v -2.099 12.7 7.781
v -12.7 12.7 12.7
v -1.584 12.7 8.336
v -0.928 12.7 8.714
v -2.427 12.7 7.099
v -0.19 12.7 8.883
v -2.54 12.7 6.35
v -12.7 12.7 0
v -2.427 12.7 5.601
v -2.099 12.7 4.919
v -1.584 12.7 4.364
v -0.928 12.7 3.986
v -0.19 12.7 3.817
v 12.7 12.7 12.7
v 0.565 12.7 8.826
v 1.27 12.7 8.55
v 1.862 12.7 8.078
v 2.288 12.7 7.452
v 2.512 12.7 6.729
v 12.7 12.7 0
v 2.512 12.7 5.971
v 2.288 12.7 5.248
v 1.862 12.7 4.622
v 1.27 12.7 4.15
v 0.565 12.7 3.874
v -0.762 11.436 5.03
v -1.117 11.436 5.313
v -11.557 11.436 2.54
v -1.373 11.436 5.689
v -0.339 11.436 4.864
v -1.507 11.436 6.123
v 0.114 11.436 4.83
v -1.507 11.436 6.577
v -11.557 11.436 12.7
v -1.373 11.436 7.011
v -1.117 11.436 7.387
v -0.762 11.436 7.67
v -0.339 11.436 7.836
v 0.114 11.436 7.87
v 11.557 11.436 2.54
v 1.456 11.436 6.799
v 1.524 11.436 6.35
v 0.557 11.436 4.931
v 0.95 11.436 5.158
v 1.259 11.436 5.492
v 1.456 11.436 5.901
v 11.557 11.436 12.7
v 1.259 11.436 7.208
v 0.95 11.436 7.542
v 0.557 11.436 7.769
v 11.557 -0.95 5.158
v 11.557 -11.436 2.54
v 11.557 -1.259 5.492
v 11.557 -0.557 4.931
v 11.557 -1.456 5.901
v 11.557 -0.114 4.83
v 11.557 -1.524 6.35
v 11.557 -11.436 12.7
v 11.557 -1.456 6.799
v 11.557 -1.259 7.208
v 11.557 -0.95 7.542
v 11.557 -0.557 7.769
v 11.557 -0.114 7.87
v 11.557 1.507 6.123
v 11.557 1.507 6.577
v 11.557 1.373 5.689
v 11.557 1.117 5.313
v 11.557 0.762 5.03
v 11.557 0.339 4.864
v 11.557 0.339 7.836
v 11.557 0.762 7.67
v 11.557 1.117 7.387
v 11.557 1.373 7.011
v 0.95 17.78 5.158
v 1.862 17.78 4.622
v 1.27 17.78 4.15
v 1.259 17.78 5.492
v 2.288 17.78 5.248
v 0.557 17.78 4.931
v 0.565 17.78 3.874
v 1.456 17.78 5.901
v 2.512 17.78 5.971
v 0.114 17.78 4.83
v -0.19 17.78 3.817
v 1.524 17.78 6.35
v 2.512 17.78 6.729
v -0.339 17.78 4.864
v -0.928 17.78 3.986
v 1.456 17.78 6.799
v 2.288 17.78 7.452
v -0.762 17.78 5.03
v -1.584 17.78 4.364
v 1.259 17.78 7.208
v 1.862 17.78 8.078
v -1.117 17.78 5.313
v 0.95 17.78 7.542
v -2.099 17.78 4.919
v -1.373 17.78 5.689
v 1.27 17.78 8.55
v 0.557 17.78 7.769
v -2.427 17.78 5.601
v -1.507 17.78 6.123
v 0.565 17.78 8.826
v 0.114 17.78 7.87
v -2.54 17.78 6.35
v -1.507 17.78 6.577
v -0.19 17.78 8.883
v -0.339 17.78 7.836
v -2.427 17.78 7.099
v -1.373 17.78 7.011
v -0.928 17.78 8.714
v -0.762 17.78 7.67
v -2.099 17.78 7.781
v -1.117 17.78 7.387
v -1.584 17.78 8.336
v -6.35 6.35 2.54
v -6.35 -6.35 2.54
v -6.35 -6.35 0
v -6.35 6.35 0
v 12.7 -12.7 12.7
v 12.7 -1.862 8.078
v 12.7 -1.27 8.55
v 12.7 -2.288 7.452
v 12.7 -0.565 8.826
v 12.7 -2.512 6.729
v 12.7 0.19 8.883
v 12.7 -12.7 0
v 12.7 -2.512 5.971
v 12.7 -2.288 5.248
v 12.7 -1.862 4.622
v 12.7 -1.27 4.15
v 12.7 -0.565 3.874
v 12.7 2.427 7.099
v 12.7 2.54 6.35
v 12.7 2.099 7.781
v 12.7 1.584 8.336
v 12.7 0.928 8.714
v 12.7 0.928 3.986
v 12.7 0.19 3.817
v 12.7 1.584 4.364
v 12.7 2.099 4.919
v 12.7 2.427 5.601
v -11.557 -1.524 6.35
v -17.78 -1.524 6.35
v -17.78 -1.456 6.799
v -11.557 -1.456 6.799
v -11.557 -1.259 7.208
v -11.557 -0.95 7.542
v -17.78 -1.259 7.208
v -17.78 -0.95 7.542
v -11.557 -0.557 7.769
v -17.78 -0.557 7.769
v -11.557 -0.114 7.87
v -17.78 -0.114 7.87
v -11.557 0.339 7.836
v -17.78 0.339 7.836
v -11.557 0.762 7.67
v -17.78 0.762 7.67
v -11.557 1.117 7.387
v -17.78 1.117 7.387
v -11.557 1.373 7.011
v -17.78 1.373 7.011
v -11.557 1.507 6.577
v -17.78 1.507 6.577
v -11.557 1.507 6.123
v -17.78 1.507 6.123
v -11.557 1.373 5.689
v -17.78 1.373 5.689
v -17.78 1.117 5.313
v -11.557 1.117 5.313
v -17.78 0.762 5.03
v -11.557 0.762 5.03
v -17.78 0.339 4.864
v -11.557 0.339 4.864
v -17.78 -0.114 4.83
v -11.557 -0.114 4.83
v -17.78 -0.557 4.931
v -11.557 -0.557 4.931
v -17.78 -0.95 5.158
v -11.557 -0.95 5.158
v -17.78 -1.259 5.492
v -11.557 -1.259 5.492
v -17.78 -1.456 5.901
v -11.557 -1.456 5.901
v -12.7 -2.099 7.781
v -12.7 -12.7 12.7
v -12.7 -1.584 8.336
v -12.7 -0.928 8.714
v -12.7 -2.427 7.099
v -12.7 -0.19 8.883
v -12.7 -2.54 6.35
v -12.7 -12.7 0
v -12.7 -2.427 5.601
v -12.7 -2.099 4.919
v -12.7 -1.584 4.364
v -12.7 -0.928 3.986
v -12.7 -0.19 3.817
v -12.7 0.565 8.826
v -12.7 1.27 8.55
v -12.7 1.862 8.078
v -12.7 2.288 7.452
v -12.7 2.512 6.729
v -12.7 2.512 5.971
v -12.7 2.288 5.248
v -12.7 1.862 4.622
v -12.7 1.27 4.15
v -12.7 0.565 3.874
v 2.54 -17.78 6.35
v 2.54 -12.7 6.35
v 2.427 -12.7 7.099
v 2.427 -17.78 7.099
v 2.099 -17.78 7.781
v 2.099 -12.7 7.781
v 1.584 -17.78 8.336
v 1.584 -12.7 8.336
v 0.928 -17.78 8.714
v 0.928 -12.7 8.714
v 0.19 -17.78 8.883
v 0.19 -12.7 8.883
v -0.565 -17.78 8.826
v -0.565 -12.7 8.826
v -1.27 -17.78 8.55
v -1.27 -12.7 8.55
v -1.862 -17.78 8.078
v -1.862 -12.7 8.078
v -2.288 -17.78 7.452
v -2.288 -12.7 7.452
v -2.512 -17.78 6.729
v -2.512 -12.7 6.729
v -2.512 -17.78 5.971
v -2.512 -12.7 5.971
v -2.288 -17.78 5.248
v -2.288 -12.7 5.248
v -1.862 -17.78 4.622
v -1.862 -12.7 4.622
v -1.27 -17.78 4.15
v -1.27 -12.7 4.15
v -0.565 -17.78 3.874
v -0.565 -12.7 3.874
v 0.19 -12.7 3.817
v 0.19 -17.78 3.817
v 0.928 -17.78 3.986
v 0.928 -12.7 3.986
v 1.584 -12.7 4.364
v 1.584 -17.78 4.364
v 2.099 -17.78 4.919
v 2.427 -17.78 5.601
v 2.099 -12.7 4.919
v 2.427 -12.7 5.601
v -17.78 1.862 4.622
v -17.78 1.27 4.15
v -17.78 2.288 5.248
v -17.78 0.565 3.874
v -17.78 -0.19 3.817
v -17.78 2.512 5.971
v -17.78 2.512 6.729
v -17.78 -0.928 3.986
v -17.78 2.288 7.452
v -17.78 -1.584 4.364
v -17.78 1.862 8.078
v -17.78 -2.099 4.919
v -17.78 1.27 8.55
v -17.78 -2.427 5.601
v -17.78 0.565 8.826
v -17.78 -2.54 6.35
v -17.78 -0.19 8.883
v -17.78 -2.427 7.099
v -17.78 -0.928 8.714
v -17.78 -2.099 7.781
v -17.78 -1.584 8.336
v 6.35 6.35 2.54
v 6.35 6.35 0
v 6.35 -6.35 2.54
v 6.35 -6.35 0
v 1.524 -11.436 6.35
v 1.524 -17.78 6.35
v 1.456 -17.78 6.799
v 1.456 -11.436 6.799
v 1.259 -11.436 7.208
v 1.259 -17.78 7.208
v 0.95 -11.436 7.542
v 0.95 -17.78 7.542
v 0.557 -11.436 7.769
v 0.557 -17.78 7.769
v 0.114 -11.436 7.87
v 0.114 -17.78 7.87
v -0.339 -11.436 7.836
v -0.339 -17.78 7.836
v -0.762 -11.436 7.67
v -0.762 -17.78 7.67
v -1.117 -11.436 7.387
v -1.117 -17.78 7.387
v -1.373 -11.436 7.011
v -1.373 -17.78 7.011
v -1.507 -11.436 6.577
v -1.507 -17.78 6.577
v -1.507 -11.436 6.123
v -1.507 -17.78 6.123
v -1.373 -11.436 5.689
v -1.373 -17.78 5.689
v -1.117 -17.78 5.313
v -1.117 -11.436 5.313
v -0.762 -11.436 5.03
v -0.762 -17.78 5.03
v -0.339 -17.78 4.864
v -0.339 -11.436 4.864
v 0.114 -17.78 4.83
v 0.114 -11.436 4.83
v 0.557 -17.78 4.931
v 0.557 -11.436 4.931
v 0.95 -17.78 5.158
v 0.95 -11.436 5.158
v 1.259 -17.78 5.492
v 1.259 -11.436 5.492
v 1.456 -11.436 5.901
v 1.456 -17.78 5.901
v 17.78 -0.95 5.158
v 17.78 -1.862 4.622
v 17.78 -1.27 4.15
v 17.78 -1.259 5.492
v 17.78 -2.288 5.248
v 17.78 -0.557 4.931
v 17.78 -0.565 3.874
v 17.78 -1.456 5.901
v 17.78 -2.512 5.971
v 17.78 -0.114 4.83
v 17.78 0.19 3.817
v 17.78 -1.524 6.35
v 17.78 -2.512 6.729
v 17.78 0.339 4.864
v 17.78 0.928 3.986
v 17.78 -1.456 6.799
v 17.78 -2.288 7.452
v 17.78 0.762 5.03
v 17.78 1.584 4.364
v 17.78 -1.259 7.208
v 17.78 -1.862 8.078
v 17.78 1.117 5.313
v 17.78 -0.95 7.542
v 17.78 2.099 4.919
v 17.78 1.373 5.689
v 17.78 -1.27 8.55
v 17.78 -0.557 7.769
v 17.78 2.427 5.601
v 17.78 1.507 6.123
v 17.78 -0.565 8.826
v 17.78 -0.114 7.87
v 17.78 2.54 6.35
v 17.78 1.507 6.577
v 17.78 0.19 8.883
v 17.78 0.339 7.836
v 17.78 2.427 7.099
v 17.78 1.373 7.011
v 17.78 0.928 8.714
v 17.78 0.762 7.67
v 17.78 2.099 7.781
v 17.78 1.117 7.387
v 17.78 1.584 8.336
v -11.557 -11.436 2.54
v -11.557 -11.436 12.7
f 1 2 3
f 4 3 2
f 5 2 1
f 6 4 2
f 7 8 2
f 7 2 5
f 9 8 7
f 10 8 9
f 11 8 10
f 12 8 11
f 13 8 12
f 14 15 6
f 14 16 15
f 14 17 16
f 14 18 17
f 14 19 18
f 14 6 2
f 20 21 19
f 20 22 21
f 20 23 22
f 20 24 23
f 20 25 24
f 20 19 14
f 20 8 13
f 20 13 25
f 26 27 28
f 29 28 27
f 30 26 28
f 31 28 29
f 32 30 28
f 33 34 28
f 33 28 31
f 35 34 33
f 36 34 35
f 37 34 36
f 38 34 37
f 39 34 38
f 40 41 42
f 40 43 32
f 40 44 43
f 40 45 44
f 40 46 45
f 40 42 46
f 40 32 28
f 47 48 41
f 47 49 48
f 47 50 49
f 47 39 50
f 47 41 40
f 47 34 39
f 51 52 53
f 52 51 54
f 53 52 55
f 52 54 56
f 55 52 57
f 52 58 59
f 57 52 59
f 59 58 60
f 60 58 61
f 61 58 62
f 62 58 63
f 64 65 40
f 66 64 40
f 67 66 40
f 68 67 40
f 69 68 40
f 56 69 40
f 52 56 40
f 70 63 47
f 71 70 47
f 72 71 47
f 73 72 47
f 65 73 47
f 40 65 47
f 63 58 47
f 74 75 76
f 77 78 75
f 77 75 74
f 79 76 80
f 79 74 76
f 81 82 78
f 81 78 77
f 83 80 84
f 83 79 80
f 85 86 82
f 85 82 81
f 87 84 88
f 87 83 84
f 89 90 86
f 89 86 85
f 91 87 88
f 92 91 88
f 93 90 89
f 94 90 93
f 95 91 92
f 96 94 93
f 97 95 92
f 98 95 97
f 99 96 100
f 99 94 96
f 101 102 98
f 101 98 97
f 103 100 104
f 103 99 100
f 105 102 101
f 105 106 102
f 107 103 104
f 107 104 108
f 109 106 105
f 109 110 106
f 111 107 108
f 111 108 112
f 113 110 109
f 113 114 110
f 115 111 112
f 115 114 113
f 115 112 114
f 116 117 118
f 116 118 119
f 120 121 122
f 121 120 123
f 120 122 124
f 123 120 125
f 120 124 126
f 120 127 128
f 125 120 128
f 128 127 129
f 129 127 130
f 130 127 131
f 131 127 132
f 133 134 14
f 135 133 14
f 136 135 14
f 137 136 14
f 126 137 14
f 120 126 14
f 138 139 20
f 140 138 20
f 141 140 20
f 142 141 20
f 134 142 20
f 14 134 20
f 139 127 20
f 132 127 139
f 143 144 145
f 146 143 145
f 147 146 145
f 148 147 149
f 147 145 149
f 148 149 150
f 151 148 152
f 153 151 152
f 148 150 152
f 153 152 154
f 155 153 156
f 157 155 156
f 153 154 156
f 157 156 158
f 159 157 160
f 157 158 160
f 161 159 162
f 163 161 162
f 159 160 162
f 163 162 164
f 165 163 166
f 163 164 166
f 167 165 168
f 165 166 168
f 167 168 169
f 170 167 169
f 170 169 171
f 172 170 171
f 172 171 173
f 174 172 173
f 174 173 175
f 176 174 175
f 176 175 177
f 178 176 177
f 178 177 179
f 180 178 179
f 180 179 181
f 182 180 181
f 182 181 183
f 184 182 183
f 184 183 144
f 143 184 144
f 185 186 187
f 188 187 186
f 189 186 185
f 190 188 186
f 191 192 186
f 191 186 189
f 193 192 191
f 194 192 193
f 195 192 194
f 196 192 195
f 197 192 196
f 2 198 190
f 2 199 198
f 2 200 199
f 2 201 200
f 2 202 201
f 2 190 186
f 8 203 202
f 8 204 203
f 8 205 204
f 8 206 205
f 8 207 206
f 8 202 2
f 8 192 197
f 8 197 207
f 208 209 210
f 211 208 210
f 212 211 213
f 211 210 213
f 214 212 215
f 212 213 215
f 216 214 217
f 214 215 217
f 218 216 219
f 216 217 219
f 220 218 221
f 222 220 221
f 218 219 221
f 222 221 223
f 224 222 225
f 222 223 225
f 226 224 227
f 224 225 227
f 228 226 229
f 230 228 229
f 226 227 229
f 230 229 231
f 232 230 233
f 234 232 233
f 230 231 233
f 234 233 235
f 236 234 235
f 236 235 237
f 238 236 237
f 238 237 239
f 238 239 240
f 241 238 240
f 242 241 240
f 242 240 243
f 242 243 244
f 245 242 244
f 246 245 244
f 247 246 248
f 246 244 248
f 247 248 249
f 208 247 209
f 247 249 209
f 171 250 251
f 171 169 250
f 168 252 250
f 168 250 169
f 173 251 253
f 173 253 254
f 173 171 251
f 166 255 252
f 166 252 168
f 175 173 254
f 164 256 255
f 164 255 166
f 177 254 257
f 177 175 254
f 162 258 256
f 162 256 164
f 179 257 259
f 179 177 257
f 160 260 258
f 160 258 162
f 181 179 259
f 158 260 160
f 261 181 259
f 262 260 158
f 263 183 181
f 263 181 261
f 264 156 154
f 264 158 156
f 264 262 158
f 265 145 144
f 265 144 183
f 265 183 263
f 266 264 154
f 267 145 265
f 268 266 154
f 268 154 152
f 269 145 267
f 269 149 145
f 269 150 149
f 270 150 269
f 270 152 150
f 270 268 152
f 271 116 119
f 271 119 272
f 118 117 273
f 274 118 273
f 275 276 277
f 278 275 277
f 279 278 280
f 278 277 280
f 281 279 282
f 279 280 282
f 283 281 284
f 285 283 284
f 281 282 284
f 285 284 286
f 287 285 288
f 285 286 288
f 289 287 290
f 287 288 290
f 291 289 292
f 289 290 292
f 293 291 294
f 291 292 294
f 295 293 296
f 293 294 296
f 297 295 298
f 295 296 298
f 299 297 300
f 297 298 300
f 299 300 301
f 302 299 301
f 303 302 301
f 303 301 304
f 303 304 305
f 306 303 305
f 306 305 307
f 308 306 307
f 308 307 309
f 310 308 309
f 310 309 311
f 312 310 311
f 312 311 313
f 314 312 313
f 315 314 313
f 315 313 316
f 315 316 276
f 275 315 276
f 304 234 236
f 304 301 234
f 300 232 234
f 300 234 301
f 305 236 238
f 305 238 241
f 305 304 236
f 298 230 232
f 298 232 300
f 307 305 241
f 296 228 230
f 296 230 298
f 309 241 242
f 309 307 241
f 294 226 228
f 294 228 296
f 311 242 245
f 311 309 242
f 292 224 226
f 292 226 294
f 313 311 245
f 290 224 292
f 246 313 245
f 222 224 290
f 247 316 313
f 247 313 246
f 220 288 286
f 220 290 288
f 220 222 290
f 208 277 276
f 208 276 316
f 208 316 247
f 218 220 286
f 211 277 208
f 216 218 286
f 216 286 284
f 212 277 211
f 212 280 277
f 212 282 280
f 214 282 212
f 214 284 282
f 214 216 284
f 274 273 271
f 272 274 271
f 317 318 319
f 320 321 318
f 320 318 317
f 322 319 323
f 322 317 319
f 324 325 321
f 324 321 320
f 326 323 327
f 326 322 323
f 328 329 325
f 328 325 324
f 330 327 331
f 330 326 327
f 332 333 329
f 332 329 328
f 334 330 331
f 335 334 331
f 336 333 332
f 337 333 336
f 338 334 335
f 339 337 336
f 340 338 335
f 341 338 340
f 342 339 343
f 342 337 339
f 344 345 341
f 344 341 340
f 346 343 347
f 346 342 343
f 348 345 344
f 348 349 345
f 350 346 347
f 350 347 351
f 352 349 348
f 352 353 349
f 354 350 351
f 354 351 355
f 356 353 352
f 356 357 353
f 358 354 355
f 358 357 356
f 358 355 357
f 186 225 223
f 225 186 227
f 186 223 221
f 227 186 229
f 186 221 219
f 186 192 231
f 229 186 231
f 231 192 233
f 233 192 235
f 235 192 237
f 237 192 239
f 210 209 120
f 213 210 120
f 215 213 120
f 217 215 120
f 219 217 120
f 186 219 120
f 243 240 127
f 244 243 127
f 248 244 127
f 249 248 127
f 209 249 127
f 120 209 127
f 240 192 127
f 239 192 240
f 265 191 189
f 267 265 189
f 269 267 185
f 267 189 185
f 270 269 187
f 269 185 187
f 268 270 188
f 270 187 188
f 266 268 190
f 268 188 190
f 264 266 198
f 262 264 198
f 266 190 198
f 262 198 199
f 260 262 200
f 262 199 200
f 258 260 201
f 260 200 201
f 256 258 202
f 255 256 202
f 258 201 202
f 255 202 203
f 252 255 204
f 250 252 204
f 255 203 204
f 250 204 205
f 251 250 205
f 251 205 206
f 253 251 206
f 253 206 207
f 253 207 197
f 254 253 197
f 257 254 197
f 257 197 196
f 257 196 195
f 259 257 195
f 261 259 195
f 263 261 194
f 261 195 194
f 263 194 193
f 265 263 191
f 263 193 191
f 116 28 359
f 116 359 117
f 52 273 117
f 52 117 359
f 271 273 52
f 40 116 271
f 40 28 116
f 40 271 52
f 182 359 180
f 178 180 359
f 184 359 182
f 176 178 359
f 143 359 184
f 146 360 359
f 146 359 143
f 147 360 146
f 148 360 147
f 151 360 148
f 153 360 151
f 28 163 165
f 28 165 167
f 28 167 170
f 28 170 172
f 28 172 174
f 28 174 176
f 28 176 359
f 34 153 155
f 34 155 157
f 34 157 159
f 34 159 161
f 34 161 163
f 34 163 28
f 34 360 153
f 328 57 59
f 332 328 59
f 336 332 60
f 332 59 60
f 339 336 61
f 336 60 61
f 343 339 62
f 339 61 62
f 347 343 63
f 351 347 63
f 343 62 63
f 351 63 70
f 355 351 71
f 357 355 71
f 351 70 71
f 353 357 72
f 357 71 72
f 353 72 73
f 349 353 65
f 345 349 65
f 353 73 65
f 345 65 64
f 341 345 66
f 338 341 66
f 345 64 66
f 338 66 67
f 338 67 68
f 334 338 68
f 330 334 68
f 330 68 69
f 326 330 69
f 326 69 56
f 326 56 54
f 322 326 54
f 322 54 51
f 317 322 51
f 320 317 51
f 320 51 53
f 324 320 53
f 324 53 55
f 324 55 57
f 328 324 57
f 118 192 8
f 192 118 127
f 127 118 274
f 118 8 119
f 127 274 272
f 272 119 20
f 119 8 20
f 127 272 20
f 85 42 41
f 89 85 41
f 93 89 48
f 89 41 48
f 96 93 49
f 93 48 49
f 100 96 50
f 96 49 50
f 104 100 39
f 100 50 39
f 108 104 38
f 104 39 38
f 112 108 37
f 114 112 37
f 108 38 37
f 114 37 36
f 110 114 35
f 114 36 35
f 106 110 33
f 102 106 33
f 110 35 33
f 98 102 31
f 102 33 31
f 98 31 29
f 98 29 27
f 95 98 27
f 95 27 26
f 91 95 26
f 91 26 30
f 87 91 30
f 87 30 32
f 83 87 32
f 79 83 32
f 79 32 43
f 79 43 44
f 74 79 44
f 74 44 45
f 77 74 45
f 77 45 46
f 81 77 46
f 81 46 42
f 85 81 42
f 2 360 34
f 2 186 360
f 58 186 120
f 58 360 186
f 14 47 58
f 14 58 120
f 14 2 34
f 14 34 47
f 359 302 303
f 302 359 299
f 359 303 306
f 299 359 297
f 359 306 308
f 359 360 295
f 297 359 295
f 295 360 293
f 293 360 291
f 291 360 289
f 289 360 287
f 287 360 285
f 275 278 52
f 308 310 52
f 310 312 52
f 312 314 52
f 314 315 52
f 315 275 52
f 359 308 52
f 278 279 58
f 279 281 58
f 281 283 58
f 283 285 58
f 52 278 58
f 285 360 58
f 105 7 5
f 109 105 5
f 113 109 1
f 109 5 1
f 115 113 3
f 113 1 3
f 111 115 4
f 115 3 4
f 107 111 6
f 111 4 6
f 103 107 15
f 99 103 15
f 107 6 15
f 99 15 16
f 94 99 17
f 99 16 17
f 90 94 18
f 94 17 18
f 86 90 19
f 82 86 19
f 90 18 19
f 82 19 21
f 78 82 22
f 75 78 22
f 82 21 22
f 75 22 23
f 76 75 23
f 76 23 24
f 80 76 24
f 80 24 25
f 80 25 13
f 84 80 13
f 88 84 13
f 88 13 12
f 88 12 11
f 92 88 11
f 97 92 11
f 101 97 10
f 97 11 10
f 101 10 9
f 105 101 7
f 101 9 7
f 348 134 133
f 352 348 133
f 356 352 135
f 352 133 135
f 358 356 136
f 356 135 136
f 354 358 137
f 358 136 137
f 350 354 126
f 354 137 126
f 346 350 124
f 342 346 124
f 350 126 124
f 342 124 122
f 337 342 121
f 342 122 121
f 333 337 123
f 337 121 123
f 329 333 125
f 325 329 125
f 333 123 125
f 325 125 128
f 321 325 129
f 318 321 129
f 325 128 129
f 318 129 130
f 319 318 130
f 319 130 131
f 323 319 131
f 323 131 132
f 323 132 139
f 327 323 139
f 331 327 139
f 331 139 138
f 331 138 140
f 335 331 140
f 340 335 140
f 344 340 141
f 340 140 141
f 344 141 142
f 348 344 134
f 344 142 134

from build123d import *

# Parameters (mm, degrees)
F0_W      = 25.4
F0_H      = 25.4
F1_DEPTH  = 12.7
F2_W      = 23.1146477163
F2_H      = 22.8712297976
F3_DEPTH  = 10.16
F4_R      = 2.54
F5_DEPTH  = 5.08
F6_R      = 2.54
F7_DEPTH  = 5.08
F8_R      = 1.524
F9_DEPTH  = 35.561
F10_R     = 2.54
F11_DEPTH = 5.08
F12_R     = 2.54
F13_DEPTH = 5.08
F14_R     = 1.524
F15_DEPTH = 35.561
F16_W     = 12.7
F16_H     = 12.7
F17_DEPTH = 2.541


with BuildPart() as f1:
    # F0 (on Top) → F1 (new body)
    with BuildSketch(Plane.XY):
        Rectangle(F0_W, F0_H)
    extrude(amount=F1_DEPTH)

    # F2 (on face) → F3 (cut)
    with BuildSketch(Plane.XY.offset(12.7)):
        Rectangle(F2_W, F2_H)
    extrude(amount=-F3_DEPTH, mode=Mode.SUBTRACT)

    # F4 (on face) → F5 (join)
    with BuildSketch(Plane(origin=(0, 12.7, 0), x_dir=(-1, 0, 0), z_dir=(0, 1, 0))):
        with Locations((0, 6.35)):
            Circle(F4_R)
    extrude(amount=F5_DEPTH)

    # F6 (on face) → F7 (join)
    with BuildSketch(Plane.XZ.offset(12.7)):
        with Locations((0, 6.35)):
            Circle(F6_R)
    extrude(amount=F7_DEPTH)

    # F8 (on face) → F9 (cut, through all)
    with BuildSketch(Plane.XZ.offset(17.78)):
        with Locations((0, 6.35)):
            Circle(F8_R)
    extrude(amount=-F9_DEPTH, mode=Mode.SUBTRACT)

    # F10 (on face) → F11 (join)
    with BuildSketch(Plane.YZ.offset(12.7)):
        with Locations((0, 6.35)):
            Circle(F10_R)
    extrude(amount=F11_DEPTH)

    # F12 (on face) → F13 (join)
    with BuildSketch(Plane(origin=(-12.7, 0, 0), x_dir=(0, -1, 0), z_dir=(-1, 0, 0))):
        with Locations((0, 6.35)):
            Circle(F12_R)
    extrude(amount=F13_DEPTH)

    # F14 (on face) → F15 (cut, through all)
    with BuildSketch(Plane(origin=(-17.78, 0, 0), x_dir=(0, -1, 0), z_dir=(-1, 0, 0))):
        with Locations((0, 6.35)):
            Circle(F14_R)
    extrude(amount=-F15_DEPTH, mode=Mode.SUBTRACT)

    # F16 (on face) → F17 (cut, through all)
    with BuildSketch(Plane.XY.offset(2.54)):
        Rectangle(F16_W, F16_H)
    extrude(amount=-F17_DEPTH, mode=Mode.SUBTRACT)


solid = f1.part
